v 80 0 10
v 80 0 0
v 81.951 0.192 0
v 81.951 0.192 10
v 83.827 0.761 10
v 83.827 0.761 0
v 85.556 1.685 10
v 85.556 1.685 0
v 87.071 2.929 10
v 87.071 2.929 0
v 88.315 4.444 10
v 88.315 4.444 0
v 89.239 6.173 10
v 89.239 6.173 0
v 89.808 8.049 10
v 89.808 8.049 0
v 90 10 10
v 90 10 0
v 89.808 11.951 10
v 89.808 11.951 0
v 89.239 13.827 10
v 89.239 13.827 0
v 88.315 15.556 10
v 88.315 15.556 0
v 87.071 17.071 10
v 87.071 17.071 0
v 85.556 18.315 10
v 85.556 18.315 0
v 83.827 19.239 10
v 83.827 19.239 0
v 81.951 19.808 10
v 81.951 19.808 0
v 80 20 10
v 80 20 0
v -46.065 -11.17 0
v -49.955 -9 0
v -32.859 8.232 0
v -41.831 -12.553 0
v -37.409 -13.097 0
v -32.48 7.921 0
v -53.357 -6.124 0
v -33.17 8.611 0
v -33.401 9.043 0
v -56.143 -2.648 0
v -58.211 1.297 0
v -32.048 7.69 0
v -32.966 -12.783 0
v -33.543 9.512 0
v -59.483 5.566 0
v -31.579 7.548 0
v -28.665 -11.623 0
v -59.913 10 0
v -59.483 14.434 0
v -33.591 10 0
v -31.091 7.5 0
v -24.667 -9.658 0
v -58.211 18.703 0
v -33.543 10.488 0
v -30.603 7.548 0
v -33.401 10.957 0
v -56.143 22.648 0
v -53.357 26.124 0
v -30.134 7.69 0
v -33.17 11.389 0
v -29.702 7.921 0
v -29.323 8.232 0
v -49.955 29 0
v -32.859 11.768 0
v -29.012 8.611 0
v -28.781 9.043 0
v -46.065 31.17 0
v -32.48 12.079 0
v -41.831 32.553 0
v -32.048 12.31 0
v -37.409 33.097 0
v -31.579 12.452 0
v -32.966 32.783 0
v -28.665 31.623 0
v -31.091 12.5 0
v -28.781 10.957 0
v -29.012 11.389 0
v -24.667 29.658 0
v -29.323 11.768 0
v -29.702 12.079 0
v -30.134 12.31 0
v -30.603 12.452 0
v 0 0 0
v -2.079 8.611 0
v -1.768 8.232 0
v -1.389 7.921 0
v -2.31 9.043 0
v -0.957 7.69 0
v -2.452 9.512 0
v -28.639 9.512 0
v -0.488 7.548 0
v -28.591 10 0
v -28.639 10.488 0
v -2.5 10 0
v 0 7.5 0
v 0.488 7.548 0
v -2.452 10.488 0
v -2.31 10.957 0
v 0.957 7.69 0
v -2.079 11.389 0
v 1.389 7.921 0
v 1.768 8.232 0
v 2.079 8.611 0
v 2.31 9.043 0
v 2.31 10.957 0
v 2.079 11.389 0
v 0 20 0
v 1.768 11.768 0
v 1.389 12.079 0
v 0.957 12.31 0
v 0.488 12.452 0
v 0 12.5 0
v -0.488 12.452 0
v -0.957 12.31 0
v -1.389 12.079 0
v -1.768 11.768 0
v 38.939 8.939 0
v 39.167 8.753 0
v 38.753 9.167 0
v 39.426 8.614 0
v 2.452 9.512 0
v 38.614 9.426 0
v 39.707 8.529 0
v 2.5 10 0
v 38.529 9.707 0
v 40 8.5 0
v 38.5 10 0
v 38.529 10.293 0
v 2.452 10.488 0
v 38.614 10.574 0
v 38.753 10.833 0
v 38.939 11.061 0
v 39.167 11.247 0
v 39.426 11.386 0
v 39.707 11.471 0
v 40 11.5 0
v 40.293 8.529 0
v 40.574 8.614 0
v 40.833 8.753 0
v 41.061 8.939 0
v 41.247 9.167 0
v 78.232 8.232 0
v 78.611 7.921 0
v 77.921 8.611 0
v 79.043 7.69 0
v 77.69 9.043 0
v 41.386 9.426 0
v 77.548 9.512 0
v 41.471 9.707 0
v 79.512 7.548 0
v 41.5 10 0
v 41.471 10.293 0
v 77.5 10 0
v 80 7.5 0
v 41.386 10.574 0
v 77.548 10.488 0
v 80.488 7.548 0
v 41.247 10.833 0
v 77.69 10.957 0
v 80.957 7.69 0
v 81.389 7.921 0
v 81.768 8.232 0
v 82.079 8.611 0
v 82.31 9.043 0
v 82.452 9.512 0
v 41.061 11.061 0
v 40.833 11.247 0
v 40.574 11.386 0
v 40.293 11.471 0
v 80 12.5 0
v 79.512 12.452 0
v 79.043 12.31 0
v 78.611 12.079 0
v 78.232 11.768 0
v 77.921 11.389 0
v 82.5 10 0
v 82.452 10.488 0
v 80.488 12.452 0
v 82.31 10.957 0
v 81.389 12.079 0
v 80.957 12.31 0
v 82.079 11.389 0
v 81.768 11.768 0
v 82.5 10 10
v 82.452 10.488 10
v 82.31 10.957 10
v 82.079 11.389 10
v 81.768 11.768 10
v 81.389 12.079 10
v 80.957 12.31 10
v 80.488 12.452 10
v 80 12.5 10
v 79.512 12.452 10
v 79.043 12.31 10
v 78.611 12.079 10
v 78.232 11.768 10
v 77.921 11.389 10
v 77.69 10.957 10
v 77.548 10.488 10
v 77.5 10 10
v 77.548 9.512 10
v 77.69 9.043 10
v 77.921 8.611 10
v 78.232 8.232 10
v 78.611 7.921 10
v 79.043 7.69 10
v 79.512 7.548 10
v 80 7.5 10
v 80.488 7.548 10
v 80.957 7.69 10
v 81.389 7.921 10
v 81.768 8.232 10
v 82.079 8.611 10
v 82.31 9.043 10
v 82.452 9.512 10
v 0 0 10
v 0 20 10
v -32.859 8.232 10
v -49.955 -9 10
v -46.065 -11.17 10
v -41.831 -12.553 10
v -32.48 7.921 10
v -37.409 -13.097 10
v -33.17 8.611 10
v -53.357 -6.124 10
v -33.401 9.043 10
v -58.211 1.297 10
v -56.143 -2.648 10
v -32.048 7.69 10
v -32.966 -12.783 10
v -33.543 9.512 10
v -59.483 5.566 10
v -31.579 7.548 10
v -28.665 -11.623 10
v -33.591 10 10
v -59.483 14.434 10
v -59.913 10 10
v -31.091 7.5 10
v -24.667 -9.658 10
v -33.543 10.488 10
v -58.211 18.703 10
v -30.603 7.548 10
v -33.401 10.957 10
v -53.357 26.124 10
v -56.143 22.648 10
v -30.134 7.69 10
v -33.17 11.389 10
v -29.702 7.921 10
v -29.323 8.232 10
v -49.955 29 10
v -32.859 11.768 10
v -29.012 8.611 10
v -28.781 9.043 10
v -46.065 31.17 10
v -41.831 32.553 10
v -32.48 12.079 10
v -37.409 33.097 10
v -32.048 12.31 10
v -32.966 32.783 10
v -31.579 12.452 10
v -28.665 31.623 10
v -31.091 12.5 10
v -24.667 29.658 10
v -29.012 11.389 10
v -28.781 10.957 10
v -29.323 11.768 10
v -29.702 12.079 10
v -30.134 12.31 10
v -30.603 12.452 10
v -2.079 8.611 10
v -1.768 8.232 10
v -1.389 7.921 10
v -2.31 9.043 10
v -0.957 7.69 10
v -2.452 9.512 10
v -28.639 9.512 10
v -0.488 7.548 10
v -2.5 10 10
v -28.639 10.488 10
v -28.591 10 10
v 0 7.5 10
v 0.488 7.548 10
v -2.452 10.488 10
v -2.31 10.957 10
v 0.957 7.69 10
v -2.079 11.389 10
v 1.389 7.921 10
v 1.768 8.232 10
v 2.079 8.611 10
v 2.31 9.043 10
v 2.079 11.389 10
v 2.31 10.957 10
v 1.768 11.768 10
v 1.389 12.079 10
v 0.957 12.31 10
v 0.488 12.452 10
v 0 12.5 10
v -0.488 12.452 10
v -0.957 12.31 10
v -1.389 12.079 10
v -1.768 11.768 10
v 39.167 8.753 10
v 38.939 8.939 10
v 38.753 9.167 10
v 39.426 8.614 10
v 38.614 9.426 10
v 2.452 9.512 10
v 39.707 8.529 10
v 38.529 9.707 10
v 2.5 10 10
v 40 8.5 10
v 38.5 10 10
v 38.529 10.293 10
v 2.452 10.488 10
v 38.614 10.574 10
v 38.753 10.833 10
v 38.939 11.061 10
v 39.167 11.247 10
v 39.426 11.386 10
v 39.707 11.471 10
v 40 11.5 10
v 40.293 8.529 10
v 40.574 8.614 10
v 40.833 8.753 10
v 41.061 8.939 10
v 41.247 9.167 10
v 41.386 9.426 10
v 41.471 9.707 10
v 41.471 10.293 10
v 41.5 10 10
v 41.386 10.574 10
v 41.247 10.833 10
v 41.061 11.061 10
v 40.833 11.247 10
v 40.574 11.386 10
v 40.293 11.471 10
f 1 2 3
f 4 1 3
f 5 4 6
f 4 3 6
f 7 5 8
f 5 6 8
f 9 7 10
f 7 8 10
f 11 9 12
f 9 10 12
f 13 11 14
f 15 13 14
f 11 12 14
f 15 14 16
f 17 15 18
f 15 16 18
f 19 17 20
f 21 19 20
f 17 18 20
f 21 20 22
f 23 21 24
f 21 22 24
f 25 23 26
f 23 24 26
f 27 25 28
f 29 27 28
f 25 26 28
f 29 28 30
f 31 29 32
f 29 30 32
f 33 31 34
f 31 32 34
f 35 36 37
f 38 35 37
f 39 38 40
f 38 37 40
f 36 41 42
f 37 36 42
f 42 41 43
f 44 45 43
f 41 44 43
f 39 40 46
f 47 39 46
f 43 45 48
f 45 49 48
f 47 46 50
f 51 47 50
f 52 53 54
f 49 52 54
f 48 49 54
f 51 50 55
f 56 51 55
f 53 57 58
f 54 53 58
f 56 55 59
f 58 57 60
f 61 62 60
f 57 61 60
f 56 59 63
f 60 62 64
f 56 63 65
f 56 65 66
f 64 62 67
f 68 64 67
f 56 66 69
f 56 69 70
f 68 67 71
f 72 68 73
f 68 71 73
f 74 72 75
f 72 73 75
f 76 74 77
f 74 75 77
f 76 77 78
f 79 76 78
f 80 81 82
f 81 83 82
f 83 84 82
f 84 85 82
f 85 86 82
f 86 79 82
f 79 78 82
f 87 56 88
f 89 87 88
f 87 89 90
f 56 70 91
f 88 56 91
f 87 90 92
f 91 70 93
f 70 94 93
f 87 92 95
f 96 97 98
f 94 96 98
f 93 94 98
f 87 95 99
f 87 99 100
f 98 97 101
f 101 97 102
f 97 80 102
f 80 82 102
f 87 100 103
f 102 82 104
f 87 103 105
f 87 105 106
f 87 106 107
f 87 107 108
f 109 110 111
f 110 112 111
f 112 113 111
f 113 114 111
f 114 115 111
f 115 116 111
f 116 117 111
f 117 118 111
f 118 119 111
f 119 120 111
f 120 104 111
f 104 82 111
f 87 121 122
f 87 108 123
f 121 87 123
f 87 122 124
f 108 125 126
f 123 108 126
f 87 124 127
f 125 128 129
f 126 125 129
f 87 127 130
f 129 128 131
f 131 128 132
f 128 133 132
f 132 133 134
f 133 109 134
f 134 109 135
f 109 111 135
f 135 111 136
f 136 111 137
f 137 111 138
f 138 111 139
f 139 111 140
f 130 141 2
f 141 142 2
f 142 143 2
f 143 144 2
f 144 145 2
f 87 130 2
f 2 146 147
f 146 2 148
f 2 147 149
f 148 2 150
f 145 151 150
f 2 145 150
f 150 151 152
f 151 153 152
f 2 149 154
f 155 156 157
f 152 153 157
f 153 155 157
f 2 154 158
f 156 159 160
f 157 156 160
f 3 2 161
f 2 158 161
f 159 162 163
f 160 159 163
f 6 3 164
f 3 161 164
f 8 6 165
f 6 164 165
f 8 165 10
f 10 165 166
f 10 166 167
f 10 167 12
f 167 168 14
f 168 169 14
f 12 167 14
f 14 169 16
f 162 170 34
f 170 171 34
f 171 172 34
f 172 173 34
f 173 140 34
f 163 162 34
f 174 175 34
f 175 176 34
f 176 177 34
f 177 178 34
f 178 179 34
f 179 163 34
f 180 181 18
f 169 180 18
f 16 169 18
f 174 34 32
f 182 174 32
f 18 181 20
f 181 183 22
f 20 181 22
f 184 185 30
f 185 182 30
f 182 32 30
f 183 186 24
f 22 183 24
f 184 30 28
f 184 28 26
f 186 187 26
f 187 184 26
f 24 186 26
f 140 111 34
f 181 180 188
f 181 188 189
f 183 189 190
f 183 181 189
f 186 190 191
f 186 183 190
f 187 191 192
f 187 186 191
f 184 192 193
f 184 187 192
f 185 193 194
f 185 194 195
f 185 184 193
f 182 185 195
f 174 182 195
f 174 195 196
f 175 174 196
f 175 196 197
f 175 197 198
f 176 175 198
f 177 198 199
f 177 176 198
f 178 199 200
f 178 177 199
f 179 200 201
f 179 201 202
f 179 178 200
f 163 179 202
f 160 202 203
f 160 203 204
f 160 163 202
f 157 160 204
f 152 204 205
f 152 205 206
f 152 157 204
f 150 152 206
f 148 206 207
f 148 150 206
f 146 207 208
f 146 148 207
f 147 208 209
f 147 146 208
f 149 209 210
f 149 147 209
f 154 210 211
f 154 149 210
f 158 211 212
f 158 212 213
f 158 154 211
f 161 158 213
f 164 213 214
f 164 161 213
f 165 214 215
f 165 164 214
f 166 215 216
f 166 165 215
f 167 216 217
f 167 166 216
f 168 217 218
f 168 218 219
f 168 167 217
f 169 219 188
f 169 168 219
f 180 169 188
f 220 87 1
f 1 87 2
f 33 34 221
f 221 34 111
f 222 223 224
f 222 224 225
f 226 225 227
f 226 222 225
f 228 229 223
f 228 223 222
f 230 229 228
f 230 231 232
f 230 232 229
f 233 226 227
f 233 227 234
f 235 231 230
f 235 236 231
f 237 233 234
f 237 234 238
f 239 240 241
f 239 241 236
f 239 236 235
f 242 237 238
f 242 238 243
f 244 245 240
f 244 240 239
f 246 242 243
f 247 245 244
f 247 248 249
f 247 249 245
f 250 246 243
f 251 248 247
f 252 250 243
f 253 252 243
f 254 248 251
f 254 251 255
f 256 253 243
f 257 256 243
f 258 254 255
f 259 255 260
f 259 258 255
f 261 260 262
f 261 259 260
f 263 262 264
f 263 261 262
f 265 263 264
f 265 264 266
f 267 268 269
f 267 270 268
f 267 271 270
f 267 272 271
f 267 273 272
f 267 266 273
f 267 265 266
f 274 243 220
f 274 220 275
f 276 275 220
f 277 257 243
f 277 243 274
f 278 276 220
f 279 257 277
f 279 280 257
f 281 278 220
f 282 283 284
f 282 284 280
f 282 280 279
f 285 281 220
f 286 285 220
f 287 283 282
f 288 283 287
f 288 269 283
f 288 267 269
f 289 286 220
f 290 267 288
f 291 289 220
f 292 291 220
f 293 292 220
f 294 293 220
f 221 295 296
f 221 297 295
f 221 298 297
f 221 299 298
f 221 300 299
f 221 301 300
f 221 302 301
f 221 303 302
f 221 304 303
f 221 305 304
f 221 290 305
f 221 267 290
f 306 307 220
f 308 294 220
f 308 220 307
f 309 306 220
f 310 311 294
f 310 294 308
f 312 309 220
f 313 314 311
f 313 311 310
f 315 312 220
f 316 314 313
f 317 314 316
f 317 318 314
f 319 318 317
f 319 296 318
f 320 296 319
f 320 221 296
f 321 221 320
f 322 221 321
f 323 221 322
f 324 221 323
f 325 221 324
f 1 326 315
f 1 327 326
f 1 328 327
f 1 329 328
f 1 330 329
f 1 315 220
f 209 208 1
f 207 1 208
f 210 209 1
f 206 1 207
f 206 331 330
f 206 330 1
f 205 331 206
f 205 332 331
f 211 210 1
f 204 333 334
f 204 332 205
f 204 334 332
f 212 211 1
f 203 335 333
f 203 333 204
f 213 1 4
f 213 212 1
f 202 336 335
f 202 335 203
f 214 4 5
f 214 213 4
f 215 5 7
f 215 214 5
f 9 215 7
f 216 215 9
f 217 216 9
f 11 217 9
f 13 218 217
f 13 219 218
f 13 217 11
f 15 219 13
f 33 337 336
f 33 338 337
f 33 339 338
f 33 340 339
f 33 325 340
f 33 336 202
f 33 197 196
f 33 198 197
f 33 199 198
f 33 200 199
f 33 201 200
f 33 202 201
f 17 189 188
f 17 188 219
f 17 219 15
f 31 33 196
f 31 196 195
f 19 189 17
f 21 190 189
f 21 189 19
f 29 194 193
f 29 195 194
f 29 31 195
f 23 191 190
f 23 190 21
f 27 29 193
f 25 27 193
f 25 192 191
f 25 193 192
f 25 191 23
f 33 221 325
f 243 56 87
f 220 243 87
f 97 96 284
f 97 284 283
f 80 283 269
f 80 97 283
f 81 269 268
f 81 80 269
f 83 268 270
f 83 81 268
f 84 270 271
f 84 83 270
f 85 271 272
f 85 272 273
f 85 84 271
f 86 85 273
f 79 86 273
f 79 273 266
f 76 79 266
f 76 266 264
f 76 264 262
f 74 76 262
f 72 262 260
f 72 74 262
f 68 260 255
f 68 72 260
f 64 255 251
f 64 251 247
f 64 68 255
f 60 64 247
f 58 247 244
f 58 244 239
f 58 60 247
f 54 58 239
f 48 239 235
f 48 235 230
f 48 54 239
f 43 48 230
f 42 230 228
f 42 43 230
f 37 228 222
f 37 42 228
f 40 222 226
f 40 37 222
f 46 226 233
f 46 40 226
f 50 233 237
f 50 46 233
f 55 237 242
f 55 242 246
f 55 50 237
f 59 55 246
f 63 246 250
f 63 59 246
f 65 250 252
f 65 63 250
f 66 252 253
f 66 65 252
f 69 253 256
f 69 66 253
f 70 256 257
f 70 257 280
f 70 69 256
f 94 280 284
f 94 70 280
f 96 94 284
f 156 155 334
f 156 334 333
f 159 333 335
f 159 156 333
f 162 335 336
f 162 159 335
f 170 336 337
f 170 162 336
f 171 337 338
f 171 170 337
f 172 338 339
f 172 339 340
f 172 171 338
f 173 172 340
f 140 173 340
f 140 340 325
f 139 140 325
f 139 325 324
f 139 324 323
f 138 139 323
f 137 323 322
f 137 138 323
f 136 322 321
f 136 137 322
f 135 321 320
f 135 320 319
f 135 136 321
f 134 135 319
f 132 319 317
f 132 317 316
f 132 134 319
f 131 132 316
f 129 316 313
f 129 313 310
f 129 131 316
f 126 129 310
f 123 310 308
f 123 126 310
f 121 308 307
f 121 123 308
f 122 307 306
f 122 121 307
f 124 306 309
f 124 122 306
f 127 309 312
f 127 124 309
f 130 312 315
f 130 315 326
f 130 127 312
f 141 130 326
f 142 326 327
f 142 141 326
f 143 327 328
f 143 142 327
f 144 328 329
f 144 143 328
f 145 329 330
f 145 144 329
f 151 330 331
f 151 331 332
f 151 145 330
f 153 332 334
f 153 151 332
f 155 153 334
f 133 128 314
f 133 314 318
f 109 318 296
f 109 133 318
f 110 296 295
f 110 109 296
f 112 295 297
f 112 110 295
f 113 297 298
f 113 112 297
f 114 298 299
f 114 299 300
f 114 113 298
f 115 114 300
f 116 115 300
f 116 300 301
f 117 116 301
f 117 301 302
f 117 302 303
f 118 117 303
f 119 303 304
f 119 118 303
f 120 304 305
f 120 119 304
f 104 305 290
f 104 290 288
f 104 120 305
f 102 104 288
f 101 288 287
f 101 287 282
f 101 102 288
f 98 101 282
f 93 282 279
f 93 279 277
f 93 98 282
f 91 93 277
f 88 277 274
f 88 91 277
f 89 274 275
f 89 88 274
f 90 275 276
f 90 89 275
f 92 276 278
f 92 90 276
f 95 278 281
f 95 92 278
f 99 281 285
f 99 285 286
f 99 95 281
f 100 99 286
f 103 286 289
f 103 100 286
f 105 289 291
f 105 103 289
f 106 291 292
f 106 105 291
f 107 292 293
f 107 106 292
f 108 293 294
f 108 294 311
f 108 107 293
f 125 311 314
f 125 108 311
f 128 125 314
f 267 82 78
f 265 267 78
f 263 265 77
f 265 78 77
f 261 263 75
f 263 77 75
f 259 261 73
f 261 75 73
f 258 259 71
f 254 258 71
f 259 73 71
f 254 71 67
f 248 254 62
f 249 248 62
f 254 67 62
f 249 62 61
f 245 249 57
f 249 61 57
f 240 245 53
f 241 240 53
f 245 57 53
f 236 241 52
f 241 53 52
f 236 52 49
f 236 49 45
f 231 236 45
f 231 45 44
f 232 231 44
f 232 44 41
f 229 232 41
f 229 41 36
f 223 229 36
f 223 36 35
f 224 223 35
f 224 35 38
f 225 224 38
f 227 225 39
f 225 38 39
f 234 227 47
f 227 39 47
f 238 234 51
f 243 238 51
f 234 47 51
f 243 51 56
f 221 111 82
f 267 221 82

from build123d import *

# Parameters (mm, degrees)
ESQUISSE1_R        = 2.5
ESQUISSE1_R_2      = 1.5
BOSS_EXTRU_1_DEPTH = 10


with BuildPart() as part:
    # Esquisse1 → Boss.-Extru.1 (new body)
    with BuildSketch(Plane.XY):
        with BuildLine():
            Line((0, 0), (80, 0))
            ThreePointArc((80, 0), (90, 10), (80, 20))
            Line((80, 20), (0, 20))
            Line((0, 20), (-24.667286758, 29.658401944))
            ThreePointArc((-24.667286758, 29.658401944), (-59.912850456, 10), (-24.667286758, -9.658401944))
            Line((-24.667286758, -9.658401944), (0, 0))
        make_face()
        with Locations((0, 10)):
            Circle(ESQUISSE1_R, mode=Mode.SUBTRACT)
        with Locations((80, 10)):
            Circle(ESQUISSE1_R, mode=Mode.SUBTRACT)
        with Locations((-31.091119471, 10)):
            Circle(ESQUISSE1_R, mode=Mode.SUBTRACT)
        with Locations((40, 10)):
            Circle(ESQUISSE1_R_2, mode=Mode.SUBTRACT)
    extrude(amount=BOSS_EXTRU_1_DEPTH)


solid = part.part
